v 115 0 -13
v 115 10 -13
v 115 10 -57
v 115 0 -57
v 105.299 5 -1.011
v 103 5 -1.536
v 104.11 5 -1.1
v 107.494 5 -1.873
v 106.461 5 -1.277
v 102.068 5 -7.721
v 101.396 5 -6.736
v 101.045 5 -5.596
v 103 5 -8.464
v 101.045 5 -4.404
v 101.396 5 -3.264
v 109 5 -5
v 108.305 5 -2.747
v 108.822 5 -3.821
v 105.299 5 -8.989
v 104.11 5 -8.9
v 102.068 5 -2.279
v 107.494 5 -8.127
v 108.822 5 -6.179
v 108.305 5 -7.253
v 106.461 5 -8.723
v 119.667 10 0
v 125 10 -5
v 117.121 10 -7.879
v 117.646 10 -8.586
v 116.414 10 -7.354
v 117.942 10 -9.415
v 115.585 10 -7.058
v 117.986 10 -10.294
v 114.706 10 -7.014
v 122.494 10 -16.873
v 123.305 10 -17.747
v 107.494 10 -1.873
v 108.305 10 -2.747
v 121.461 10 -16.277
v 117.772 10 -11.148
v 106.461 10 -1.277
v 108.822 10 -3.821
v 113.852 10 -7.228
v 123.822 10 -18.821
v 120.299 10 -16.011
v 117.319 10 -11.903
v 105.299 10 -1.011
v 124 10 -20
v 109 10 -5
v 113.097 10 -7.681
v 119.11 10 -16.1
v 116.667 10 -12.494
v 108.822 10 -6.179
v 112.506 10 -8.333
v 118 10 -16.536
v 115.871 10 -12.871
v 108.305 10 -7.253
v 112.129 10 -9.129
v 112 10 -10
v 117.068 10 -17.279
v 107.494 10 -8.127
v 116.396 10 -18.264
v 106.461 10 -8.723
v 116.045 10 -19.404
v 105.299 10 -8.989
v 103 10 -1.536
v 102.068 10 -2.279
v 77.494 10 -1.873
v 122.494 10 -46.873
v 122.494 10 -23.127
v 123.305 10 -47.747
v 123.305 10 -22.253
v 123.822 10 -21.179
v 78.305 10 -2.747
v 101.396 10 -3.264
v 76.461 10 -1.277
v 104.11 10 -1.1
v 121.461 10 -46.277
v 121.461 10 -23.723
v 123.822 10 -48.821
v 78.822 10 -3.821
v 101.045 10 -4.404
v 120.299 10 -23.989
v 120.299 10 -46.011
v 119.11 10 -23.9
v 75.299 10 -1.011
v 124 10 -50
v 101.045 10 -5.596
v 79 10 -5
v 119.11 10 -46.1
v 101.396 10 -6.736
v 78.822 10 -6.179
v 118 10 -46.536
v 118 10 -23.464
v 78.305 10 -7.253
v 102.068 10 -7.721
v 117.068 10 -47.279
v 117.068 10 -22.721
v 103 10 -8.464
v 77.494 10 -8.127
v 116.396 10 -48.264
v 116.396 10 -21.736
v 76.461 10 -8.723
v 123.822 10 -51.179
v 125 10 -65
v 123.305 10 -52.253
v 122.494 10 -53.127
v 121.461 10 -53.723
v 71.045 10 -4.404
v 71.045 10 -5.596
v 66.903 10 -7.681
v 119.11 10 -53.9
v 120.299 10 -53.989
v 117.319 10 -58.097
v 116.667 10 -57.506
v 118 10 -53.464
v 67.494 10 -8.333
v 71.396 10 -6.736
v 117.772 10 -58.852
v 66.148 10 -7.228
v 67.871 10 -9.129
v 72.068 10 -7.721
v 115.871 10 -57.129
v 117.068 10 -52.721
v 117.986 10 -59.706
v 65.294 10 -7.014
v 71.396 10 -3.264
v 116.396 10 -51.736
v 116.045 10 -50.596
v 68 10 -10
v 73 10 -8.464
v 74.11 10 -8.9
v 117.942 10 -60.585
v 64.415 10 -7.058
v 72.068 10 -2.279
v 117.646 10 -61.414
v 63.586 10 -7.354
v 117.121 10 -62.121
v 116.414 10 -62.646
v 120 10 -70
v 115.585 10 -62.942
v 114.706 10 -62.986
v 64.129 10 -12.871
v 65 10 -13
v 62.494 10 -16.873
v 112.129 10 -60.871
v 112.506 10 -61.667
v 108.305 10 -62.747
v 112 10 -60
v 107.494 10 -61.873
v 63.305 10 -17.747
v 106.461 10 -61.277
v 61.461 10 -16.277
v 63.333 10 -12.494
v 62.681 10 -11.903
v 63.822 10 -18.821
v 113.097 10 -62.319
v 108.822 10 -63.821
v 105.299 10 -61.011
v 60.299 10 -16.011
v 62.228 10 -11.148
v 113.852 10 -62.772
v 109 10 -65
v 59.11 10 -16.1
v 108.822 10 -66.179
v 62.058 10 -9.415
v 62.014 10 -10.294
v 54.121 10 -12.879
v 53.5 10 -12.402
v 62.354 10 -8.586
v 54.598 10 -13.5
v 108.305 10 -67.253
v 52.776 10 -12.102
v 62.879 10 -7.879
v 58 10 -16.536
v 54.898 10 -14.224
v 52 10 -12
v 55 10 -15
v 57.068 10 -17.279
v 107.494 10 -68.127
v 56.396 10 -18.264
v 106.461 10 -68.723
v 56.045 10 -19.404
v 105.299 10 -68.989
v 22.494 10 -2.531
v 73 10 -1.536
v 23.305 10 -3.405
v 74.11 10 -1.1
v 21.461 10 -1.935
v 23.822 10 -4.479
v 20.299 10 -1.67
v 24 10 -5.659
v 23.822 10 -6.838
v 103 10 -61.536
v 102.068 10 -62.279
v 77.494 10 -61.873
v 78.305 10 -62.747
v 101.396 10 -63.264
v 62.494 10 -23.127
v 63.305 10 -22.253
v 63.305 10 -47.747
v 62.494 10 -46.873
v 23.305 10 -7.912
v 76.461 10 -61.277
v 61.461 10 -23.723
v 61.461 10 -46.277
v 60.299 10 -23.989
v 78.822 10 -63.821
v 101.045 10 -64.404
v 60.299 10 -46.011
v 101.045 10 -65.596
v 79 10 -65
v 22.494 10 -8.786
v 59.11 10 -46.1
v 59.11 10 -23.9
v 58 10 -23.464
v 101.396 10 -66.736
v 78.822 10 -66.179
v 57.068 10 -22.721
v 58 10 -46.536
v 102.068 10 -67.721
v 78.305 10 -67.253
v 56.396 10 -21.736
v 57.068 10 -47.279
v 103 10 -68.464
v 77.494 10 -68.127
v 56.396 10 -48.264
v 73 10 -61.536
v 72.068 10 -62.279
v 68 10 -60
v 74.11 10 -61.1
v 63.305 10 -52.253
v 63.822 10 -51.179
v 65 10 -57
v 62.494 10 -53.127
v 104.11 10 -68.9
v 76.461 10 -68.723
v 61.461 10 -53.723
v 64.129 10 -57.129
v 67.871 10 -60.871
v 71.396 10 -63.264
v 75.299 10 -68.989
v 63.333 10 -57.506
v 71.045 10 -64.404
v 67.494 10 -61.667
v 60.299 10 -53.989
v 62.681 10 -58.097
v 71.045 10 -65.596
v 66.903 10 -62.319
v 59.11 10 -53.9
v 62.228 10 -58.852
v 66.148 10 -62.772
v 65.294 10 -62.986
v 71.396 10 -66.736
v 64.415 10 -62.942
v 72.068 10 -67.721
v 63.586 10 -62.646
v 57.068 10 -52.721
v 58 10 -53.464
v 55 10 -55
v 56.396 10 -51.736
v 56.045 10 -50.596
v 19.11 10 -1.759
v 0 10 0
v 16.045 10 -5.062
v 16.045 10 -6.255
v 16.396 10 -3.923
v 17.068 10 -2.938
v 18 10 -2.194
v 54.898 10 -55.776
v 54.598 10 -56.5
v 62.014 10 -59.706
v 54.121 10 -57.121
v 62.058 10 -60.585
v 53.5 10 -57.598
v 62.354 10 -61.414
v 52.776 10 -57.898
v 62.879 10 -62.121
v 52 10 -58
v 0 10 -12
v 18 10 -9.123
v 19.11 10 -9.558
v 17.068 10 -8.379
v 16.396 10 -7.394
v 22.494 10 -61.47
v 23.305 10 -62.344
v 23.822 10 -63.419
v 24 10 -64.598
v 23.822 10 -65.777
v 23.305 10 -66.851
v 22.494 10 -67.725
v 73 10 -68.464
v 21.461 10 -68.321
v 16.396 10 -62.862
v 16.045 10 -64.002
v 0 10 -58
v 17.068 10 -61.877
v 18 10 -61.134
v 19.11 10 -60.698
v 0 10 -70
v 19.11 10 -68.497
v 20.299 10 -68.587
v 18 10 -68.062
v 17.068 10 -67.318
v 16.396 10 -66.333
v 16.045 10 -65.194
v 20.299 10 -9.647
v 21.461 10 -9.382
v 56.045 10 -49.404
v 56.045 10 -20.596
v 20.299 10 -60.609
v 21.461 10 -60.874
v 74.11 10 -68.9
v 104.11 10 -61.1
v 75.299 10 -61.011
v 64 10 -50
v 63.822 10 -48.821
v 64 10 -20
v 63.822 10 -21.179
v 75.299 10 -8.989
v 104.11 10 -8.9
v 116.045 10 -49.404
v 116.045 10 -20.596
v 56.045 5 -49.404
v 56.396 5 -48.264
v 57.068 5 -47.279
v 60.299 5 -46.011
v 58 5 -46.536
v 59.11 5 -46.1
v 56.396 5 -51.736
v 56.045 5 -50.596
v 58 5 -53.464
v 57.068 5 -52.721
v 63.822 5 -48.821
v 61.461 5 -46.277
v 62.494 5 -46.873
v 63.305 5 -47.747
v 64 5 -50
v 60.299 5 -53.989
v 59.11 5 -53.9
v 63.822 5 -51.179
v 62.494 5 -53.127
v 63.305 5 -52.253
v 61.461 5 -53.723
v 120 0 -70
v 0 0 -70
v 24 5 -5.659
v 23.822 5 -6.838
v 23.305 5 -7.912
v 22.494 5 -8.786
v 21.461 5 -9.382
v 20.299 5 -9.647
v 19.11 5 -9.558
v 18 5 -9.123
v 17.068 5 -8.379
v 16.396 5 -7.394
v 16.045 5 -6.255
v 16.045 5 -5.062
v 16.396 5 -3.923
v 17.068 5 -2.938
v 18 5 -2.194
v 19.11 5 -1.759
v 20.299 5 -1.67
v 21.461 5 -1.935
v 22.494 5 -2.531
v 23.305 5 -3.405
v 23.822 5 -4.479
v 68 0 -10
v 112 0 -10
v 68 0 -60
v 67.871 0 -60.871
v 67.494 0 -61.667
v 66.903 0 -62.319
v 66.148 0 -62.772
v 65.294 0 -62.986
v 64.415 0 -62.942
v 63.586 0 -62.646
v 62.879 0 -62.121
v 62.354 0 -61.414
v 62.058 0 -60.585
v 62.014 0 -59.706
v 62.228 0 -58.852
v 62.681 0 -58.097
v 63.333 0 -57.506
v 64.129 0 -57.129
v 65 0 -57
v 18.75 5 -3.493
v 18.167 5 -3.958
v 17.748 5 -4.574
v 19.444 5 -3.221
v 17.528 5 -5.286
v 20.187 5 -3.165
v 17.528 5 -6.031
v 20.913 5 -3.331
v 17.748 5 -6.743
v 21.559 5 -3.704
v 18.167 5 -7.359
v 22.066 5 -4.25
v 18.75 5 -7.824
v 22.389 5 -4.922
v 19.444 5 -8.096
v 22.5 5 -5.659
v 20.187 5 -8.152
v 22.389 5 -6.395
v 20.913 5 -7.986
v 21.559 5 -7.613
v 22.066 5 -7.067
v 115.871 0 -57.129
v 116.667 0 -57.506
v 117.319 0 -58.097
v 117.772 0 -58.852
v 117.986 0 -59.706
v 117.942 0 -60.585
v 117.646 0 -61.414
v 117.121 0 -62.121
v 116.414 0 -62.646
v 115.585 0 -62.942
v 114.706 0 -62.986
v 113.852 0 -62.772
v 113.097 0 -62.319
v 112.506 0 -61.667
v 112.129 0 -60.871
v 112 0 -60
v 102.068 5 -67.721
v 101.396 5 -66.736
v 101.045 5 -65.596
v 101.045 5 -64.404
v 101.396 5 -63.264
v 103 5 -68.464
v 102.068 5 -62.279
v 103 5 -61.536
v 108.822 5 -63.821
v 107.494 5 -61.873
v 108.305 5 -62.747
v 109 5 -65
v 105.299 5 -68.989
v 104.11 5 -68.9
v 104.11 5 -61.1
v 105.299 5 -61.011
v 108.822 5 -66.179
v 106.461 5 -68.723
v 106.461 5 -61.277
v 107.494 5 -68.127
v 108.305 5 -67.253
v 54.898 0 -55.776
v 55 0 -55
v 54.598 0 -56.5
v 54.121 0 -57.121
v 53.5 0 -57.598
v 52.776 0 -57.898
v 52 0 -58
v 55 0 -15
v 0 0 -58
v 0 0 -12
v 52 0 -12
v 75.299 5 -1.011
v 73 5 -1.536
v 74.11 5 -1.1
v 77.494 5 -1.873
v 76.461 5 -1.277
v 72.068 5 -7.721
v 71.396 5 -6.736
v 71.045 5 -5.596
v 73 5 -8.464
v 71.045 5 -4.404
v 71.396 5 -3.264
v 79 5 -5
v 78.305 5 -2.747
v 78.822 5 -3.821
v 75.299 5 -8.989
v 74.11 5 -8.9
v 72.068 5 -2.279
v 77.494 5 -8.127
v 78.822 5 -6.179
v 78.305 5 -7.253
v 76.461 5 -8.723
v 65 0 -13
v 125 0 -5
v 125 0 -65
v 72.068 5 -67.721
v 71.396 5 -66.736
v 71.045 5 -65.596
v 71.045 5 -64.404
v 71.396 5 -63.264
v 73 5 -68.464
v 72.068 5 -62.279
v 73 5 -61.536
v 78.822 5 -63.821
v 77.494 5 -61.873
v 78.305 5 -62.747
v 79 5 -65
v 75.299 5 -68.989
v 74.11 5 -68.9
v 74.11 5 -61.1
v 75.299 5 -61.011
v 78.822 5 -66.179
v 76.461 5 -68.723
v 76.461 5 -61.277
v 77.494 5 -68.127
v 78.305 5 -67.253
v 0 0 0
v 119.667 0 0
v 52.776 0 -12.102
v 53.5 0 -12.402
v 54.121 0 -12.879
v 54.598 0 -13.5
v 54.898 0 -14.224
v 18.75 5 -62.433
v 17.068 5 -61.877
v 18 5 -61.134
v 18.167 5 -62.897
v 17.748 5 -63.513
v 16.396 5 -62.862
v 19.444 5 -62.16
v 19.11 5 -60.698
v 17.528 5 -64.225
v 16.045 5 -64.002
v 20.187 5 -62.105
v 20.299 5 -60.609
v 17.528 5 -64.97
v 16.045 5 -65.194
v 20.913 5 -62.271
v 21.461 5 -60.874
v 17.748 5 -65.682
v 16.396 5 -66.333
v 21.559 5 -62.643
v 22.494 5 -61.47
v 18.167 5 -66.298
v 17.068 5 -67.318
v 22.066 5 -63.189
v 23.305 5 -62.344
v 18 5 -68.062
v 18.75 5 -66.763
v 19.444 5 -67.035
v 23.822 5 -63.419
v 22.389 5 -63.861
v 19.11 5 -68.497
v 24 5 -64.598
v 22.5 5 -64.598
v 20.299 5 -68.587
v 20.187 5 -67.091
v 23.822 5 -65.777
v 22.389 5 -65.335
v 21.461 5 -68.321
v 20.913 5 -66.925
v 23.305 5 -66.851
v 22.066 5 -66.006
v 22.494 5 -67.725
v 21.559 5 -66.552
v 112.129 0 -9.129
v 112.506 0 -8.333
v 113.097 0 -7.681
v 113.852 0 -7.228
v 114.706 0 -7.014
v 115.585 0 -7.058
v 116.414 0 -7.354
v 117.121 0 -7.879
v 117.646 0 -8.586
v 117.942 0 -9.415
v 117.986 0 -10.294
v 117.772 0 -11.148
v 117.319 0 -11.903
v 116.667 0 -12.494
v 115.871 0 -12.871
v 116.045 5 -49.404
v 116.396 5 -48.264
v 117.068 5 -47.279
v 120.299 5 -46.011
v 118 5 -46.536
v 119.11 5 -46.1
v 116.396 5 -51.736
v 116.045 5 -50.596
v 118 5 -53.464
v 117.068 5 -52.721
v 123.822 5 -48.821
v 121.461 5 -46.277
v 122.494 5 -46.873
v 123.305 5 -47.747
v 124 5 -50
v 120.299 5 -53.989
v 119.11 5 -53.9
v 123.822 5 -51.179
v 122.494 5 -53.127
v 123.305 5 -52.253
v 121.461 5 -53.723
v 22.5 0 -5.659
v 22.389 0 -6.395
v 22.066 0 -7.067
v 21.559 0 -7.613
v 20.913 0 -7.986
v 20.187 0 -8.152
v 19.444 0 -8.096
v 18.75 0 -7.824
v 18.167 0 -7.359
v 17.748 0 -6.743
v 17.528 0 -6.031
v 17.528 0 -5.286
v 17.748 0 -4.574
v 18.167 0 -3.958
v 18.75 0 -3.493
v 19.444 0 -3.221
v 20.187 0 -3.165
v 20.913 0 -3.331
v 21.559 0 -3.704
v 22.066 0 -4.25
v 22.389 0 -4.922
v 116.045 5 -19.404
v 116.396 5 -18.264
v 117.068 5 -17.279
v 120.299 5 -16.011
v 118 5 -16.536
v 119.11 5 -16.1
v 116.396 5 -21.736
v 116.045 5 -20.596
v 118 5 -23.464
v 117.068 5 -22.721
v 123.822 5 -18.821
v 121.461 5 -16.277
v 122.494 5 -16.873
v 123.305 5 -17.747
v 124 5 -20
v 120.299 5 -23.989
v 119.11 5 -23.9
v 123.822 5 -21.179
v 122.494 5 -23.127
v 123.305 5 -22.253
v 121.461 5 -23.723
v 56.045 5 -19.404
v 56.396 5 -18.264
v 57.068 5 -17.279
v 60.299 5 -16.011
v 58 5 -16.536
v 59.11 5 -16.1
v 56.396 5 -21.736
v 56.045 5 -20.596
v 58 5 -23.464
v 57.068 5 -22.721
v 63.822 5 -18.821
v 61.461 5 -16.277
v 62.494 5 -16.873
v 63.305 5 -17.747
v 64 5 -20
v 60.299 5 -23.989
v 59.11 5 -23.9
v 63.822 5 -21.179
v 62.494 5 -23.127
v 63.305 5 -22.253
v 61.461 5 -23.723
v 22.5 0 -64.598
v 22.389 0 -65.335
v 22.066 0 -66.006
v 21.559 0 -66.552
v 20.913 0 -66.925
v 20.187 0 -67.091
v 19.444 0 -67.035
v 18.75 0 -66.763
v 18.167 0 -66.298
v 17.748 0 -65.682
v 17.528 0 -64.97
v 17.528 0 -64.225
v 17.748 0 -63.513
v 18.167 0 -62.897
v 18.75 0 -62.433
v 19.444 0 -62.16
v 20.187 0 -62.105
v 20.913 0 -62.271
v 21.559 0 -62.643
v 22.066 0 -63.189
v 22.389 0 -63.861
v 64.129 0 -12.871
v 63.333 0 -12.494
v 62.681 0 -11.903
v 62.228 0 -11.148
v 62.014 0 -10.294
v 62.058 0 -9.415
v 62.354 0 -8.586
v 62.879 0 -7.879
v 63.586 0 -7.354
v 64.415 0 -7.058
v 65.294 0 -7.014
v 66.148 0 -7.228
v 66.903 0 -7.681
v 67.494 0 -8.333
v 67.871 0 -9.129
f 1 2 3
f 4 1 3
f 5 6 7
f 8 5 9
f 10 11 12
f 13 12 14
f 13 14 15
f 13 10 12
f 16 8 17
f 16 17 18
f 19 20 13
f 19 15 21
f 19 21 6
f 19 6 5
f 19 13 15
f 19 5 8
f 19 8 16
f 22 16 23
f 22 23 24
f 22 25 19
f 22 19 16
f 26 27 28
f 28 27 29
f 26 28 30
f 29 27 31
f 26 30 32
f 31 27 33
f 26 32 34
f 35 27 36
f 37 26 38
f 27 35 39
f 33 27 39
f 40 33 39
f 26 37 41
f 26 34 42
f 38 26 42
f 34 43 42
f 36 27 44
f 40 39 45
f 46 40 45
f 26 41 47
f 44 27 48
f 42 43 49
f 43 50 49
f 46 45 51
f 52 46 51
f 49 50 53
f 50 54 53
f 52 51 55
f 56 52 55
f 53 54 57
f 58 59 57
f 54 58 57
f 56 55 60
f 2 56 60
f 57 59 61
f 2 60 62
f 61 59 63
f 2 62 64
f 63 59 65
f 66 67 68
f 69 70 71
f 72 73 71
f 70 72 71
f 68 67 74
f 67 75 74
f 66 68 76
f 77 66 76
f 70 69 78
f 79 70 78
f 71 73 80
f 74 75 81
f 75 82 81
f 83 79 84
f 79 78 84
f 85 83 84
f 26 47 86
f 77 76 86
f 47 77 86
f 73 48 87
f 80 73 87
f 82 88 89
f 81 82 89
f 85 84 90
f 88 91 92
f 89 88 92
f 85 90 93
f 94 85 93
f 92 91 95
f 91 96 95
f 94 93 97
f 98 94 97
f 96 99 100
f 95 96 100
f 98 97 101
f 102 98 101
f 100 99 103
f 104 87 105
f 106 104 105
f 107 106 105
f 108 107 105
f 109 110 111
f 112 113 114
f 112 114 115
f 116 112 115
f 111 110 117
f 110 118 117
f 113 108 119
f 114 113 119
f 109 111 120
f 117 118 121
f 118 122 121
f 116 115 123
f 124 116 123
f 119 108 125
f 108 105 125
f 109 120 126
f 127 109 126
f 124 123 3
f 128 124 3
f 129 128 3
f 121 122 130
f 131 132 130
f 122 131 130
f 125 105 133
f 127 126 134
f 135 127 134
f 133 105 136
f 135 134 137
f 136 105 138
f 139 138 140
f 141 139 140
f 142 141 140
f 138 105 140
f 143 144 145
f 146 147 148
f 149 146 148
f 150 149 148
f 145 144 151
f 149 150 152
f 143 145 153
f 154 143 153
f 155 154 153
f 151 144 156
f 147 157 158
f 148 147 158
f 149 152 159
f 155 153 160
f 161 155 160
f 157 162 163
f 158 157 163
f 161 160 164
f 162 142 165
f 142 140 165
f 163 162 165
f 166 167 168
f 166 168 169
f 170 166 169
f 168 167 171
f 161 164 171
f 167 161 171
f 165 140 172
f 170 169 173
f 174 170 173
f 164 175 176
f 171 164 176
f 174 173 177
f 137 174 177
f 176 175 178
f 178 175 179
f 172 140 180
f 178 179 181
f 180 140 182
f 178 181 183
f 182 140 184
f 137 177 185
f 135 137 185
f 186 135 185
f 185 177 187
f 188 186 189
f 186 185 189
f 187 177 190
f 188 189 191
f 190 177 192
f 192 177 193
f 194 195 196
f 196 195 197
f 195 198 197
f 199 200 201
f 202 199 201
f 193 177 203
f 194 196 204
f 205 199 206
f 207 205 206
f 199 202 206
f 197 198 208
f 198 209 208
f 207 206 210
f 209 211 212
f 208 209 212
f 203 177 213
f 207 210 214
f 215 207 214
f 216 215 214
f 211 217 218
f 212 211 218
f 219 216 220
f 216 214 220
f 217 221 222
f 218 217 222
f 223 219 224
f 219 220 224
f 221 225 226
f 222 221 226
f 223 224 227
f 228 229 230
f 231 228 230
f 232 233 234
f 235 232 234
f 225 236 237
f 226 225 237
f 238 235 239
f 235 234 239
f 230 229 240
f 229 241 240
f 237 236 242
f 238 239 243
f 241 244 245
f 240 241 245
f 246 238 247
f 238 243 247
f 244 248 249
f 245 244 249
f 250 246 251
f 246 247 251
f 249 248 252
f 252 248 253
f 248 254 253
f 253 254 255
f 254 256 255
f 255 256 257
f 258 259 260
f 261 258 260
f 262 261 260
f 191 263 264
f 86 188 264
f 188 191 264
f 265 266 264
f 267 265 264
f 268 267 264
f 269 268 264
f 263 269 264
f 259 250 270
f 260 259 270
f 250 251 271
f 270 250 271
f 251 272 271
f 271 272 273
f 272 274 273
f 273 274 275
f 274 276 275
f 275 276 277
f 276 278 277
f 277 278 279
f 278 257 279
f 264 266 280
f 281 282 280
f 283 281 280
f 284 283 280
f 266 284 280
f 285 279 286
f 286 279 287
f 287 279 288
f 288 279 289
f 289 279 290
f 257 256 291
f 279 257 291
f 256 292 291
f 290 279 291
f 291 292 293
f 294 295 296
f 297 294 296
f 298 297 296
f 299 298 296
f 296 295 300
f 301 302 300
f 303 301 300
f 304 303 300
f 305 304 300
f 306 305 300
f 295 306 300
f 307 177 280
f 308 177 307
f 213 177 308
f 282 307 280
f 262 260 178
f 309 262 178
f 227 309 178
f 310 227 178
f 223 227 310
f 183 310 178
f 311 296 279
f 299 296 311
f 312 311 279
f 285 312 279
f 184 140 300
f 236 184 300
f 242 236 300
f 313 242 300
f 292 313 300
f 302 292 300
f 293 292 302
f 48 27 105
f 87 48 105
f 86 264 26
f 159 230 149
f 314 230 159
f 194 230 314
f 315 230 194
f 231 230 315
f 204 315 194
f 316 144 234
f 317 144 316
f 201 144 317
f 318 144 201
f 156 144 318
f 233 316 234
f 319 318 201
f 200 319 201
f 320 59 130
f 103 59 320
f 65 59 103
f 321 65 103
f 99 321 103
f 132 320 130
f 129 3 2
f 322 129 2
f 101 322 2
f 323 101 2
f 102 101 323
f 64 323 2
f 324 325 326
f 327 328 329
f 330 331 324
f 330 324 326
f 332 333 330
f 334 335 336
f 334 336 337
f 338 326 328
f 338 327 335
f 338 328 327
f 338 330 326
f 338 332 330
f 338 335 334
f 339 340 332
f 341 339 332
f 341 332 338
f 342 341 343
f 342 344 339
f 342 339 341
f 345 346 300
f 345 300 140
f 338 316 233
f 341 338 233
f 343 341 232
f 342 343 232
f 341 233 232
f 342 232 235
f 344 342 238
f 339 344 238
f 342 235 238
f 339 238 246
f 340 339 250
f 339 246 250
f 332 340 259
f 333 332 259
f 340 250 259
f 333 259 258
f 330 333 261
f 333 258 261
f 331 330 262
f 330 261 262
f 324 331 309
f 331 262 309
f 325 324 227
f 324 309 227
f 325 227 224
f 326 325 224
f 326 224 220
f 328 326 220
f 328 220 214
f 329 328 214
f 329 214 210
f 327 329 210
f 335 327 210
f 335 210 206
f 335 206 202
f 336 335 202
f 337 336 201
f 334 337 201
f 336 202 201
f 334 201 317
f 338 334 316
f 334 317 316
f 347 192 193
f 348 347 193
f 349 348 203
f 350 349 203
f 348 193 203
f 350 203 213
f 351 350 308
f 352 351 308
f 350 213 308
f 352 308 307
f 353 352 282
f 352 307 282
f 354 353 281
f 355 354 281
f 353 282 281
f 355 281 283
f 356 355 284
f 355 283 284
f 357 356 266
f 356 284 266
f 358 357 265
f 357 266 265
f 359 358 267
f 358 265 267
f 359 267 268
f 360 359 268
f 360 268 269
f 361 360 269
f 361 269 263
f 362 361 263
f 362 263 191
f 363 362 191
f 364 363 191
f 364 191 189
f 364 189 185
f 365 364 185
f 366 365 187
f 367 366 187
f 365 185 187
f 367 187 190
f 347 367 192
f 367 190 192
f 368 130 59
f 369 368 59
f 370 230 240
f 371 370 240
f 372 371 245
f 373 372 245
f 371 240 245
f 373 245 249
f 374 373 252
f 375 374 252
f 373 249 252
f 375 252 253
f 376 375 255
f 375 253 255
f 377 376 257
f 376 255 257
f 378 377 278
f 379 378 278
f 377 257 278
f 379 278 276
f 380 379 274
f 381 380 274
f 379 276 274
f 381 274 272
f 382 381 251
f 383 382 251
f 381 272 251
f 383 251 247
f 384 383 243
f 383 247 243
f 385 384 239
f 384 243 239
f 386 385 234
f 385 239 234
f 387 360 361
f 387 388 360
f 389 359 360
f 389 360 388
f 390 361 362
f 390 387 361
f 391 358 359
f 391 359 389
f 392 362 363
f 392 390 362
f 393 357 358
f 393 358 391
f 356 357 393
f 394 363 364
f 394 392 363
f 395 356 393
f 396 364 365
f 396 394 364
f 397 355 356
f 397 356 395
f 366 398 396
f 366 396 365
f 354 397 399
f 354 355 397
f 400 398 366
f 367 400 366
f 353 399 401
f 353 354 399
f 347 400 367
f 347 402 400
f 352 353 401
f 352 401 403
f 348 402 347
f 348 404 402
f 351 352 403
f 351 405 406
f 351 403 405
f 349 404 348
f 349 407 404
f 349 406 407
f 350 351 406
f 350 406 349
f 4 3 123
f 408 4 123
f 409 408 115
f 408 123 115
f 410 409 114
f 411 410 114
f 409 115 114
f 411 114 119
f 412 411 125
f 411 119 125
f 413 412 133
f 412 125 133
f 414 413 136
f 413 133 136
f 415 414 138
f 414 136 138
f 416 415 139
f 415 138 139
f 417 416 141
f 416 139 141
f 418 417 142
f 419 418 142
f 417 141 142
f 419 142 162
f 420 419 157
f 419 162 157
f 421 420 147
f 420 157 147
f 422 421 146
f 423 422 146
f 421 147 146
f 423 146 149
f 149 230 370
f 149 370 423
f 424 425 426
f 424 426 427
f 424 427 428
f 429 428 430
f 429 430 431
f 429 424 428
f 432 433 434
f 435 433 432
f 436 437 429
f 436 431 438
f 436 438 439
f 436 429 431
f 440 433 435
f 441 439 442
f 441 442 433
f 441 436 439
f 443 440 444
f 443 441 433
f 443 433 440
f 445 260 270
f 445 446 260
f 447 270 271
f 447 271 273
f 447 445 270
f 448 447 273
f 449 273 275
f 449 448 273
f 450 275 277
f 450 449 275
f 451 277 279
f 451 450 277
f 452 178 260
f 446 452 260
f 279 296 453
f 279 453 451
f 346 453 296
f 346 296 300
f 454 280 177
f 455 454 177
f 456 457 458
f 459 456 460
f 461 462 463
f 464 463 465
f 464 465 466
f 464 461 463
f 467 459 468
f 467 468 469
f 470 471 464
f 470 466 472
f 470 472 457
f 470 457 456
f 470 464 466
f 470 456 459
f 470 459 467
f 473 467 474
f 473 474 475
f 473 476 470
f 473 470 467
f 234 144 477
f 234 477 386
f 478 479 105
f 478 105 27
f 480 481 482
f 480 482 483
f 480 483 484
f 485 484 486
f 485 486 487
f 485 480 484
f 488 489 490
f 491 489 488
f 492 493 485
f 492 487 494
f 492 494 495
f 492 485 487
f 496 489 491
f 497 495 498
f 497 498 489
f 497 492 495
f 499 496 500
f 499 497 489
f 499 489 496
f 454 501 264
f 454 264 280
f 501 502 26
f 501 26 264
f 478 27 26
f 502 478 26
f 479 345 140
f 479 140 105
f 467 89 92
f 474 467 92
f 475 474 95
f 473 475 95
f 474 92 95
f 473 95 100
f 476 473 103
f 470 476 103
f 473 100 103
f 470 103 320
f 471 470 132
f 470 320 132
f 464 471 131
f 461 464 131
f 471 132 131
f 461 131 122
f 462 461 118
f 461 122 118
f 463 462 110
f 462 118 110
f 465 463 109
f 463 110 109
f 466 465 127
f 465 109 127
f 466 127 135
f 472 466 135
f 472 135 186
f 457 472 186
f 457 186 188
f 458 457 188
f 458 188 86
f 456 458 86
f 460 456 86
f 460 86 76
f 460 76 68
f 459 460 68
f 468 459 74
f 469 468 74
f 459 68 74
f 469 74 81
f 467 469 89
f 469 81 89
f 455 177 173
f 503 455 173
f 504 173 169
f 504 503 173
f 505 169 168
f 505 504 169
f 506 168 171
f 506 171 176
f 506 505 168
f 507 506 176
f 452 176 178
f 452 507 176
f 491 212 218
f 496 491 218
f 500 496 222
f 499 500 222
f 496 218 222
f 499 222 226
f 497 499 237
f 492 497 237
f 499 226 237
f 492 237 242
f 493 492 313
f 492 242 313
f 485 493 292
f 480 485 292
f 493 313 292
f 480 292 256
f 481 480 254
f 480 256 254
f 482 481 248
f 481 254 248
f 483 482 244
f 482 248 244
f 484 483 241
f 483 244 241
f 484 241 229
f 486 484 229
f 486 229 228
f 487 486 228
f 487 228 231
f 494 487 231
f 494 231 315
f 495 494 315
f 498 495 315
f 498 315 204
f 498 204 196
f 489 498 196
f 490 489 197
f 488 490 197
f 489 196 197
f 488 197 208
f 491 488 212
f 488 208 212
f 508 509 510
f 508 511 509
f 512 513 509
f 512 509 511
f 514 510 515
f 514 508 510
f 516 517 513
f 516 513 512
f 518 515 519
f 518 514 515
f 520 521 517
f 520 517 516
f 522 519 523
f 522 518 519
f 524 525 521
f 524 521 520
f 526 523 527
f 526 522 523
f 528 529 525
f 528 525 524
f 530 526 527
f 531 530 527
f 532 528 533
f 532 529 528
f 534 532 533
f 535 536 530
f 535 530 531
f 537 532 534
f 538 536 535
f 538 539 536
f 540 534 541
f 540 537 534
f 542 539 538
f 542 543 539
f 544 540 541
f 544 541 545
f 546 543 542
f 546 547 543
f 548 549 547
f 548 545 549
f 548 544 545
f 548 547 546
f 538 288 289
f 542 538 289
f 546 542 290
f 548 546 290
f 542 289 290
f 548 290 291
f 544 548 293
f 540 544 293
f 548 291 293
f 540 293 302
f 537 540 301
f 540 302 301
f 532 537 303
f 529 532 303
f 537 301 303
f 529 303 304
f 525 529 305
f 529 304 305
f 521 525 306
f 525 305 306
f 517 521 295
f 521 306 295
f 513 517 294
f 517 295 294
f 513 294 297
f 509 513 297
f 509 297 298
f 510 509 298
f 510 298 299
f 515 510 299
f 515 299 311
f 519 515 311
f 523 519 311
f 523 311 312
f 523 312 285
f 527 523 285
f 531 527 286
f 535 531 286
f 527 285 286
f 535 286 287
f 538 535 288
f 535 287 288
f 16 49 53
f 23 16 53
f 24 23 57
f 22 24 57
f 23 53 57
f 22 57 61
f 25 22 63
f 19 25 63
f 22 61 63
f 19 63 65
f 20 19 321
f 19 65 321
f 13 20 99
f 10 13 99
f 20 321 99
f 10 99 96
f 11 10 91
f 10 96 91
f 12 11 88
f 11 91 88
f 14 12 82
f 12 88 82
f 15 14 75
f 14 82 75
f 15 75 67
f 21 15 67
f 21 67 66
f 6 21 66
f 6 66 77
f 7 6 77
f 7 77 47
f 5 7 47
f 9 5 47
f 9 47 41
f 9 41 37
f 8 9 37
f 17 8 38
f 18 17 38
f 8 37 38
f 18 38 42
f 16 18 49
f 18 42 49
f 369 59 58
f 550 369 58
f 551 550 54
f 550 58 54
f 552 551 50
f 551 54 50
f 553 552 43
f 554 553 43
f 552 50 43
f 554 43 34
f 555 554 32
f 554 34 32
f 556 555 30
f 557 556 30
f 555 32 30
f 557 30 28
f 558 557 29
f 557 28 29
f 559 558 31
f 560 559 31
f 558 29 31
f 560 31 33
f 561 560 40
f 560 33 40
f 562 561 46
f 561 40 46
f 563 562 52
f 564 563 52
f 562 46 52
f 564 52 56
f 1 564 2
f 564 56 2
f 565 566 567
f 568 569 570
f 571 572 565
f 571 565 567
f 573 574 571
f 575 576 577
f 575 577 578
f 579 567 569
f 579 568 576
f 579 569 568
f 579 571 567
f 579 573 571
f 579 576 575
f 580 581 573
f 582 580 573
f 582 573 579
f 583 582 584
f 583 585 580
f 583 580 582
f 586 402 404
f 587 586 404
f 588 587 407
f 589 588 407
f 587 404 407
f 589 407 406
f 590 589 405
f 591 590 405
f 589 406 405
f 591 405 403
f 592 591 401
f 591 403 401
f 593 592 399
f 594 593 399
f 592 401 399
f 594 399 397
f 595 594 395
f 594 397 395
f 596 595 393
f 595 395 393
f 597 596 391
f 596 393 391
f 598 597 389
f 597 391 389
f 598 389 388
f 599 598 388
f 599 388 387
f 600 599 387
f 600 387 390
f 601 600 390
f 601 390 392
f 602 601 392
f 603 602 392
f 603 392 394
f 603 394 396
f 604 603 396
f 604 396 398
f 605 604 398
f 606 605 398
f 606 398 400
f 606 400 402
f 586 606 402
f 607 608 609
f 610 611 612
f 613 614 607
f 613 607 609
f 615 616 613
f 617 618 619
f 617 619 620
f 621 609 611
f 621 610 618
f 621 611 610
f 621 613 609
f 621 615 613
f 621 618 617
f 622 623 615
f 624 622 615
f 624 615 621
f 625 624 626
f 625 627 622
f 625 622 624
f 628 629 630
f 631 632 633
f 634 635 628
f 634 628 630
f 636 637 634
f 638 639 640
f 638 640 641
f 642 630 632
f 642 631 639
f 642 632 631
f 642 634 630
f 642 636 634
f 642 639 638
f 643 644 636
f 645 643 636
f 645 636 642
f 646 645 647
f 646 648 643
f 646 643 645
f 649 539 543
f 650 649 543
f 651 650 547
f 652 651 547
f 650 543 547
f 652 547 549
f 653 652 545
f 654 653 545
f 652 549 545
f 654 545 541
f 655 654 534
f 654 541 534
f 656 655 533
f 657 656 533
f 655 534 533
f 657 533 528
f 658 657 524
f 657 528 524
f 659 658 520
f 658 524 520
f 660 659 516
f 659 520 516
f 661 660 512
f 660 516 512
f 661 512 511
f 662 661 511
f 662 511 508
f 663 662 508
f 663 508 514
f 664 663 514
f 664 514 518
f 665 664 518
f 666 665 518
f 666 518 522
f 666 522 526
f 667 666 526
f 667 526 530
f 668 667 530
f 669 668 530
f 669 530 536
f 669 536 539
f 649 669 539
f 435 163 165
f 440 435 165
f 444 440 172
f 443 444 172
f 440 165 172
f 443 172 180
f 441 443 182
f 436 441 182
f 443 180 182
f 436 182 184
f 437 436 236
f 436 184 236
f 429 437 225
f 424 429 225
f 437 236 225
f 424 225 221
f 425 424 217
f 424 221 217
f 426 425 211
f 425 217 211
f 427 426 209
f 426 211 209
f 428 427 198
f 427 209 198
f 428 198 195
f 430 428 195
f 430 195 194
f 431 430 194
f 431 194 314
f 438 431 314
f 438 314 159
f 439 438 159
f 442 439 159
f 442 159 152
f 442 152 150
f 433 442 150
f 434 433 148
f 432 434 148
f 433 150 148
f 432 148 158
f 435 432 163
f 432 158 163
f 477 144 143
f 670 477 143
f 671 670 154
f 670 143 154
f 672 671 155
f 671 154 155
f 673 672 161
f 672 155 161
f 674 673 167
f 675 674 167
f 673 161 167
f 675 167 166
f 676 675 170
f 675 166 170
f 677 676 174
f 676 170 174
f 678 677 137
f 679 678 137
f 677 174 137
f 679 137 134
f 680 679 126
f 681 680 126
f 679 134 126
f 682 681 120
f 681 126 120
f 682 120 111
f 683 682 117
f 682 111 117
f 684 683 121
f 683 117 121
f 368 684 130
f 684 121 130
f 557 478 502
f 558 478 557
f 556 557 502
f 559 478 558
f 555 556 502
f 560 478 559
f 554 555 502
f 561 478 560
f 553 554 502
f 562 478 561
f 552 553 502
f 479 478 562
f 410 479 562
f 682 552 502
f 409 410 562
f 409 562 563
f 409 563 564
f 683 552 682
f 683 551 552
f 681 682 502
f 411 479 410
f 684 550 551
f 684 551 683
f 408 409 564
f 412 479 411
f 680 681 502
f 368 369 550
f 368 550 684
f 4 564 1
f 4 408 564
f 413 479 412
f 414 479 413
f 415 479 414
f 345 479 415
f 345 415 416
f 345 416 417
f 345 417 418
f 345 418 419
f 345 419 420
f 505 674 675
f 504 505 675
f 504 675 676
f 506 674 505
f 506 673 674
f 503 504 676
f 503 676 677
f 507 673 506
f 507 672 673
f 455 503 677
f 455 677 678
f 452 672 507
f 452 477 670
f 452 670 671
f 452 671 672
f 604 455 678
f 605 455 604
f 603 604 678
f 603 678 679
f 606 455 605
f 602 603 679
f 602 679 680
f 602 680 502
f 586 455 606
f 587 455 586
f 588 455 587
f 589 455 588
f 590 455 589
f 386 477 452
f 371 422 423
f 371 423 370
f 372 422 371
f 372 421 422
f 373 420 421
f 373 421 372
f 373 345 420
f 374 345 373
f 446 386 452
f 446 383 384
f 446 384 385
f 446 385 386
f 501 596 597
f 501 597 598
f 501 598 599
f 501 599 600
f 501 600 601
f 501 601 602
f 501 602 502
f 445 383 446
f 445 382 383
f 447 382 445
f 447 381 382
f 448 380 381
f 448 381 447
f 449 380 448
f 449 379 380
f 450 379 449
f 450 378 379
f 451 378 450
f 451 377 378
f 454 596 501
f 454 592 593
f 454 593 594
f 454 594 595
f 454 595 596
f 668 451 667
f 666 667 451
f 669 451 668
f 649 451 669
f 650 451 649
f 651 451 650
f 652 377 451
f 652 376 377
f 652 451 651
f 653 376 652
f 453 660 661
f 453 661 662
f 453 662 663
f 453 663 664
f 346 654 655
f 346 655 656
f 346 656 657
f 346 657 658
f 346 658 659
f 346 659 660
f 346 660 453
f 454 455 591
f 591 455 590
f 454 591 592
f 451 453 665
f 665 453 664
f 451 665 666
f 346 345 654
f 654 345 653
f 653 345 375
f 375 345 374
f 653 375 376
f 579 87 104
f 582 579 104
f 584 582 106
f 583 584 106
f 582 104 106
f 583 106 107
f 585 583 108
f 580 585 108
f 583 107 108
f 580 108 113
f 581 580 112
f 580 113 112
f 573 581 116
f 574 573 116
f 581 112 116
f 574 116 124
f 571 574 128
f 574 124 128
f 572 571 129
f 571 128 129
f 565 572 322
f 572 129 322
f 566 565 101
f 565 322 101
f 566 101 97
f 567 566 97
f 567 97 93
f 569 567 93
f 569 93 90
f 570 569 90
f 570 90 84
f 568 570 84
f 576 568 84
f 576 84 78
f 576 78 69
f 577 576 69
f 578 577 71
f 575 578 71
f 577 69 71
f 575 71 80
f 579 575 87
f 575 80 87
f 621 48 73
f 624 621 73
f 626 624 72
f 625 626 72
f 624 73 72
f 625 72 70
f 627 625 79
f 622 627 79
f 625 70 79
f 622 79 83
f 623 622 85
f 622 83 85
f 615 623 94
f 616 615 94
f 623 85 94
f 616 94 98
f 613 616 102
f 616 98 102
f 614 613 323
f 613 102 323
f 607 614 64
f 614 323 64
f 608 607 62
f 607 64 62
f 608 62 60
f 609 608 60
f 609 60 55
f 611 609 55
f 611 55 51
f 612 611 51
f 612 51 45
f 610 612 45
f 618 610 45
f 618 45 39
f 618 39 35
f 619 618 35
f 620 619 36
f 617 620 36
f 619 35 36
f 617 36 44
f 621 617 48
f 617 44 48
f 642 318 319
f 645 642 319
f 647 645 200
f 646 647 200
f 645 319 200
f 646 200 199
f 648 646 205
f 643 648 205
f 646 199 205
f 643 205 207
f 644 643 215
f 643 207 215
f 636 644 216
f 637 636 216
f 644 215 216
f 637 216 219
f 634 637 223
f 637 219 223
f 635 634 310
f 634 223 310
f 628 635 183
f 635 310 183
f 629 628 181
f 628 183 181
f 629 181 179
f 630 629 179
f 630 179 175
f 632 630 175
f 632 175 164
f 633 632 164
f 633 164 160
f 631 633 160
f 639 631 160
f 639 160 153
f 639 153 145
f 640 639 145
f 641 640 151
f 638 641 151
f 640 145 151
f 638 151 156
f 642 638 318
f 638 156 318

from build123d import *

# Parameters (mm, degrees)
BOSS_EXTRUDE1_DEPTH = 10
SKETCH4_W           = 55
SKETCH4_H           = 46
CUT_EXTRUDE1_DEPTH  = 11
SKETCH5_R           = 3
SKETCH5_W           = 50
SKETCH5_H           = 50
CUT_EXTRUDE2_DEPTH  = 11
SKETCH6_R           = 4
CUT_EXTRUDE4_DEPTH  = 5
SKETCH7_R           = 2.5
CUT_EXTRUDE5_DEPTH  = 6
FILLET1_R           = 3
SKETCH8_R           = 4
CUT_EXTRUDE6_DEPTH  = 5


with BuildPart() as part:
    # Sketch3 → Boss-Extrude1 (new body)
    with BuildSketch(Plane(origin=(0, 0, 0), x_dir=(1, 0, 0), z_dir=(0, 1, 0))):
        Polygon((0, 0), (0, 70), (120, 70), (125, 65), (125, 5), (119.666666667, 0), align=None)
    extrude(amount=BOSS_EXTRUDE1_DEPTH)

    # Sketch4 → Cut-Extrude1 (cut, through all)
    with BuildSketch(Plane(origin=(0, 10, 0), x_dir=(1, 0, 0), z_dir=(0, 1, 0))):
        with Locations((27.5, 35)):
            Rectangle(SKETCH4_W, SKETCH4_H)
    extrude(amount=-CUT_EXTRUDE1_DEPTH, mode=Mode.SUBTRACT)

    # Sketch5 → Cut-Extrude2 (cut, through all)
    with BuildSketch(Plane(origin=(0, 10, 0), x_dir=(1, 0, 0), z_dir=(0, 1, 0))):
        with Locations((65, 60)):
            Circle(SKETCH5_R)
        with Locations((65, 10)):
            Circle(SKETCH5_R)
        with Locations((115, 10)):
            Circle(SKETCH5_R)
        with Locations((115, 60)):
            Circle(SKETCH5_R)
        with Locations((90, 35)):
            Rectangle(SKETCH5_W, SKETCH5_H)
        with BuildLine():
            Line((65, 57), (65, 60))
            Line((65, 60), (68, 60))
            ThreePointArc((68, 60), (62.878679656, 62.121320344), (65, 57))
        make_face()
        with BuildLine():
            Line((68, 60), (65, 60))
            Line((65, 60), (65, 57))
            ThreePointArc((65, 57), (67.121320344, 57.878679656), (68, 60))
        make_face()
        with BuildLine():
            ThreePointArc((118, 60), (115, 63), (112, 60))
            Line((112, 60), (115, 60))
            Line((115, 60), (115, 57))
            ThreePointArc((115, 57), (117.121320344, 57.878679656), (118, 60))
        make_face()
        with BuildLine():
            Line((115, 60), (112, 60))
            ThreePointArc((112, 60), (112.878679656, 57.878679656), (115, 57))
            Line((115, 57), (115, 60))
        make_face()
        with BuildLine():
            ThreePointArc((118, 10), (117.121320344, 12.121320344), (115, 13))
            Line((115, 13), (115, 10))
            Line((115, 10), (112, 10))
            ThreePointArc((112, 10), (115, 7), (118, 10))
        make_face()
        with BuildLine():
            Line((115, 10), (115, 13))
            ThreePointArc((115, 13), (112.878679656, 12.121320344), (112, 10))
            Line((112, 10), (115, 10))
        make_face()
        with BuildLine():
            ThreePointArc((68, 10), (67.121320344, 12.121320344), (65, 13))
            Line((65, 13), (65, 10))
            Line((65, 10), (68, 10))
        make_face()
        with BuildLine():
            Line((65, 10), (65, 13))
            ThreePointArc((65, 13), (62.878679656, 7.878679656), (68, 10))
            Line((68, 10), (65, 10))
        make_face()
    extrude(amount=-CUT_EXTRUDE2_DEPTH, mode=Mode.SUBTRACT)

    # Sketch6 → Cut-Extrude4 (cut)
    with BuildSketch(Plane(origin=(0, 10, 0), x_dir=(1, 0, 0), z_dir=(0, 1, 0))):
        with Locations((20, 64.59775654)):
            Circle(SKETCH6_R)
        with Locations((20, 5.658501093)):
            Circle(SKETCH6_R)
    extrude(amount=-CUT_EXTRUDE4_DEPTH, mode=Mode.SUBTRACT)

    # Sketch7 → Cut-Extrude5 (cut, through all)
    with BuildSketch(Plane(origin=(0, 5, 0), x_dir=(1, 0, 0), z_dir=(0, 1, 0))):
        with Locations((20, 64.59775654)):
            Circle(SKETCH7_R)
        with Locations((20, 5.658501093)):
            Circle(SKETCH7_R)
    extrude(amount=-CUT_EXTRUDE5_DEPTH, mode=Mode.SUBTRACT)

    # Fillet1
    fillet1_edges = [part.edges().sort_by_distance(p)[0] for p in [
        (55, 5, -58),
        (55, 5, -12),
    ]]
    fillet(fillet1_edges, radius=FILLET1_R)

    # Sketch8 → Cut-Extrude6 (cut)
    with BuildSketch(Plane(origin=(0, 10, 0), x_dir=(1, 0, 0), z_dir=(0, 1, 0))):
        with Locations((120, 50)):
            Circle(SKETCH8_R)
        with Locations((120, 20)):
            Circle(SKETCH8_R)
        with Locations((105, 65)):
            Circle(SKETCH8_R)
        with Locations((75, 65)):
            Circle(SKETCH8_R)
        with Locations((75, 5)):
            Circle(SKETCH8_R)
        with Locations((105, 5)):
            Circle(SKETCH8_R)
        with Locations((60, 50)):
            Circle(SKETCH8_R)
        with Locations((60, 20)):
            Circle(SKETCH8_R)
    extrude(amount=-CUT_EXTRUDE6_DEPTH, mode=Mode.SUBTRACT)


solid = part.part
